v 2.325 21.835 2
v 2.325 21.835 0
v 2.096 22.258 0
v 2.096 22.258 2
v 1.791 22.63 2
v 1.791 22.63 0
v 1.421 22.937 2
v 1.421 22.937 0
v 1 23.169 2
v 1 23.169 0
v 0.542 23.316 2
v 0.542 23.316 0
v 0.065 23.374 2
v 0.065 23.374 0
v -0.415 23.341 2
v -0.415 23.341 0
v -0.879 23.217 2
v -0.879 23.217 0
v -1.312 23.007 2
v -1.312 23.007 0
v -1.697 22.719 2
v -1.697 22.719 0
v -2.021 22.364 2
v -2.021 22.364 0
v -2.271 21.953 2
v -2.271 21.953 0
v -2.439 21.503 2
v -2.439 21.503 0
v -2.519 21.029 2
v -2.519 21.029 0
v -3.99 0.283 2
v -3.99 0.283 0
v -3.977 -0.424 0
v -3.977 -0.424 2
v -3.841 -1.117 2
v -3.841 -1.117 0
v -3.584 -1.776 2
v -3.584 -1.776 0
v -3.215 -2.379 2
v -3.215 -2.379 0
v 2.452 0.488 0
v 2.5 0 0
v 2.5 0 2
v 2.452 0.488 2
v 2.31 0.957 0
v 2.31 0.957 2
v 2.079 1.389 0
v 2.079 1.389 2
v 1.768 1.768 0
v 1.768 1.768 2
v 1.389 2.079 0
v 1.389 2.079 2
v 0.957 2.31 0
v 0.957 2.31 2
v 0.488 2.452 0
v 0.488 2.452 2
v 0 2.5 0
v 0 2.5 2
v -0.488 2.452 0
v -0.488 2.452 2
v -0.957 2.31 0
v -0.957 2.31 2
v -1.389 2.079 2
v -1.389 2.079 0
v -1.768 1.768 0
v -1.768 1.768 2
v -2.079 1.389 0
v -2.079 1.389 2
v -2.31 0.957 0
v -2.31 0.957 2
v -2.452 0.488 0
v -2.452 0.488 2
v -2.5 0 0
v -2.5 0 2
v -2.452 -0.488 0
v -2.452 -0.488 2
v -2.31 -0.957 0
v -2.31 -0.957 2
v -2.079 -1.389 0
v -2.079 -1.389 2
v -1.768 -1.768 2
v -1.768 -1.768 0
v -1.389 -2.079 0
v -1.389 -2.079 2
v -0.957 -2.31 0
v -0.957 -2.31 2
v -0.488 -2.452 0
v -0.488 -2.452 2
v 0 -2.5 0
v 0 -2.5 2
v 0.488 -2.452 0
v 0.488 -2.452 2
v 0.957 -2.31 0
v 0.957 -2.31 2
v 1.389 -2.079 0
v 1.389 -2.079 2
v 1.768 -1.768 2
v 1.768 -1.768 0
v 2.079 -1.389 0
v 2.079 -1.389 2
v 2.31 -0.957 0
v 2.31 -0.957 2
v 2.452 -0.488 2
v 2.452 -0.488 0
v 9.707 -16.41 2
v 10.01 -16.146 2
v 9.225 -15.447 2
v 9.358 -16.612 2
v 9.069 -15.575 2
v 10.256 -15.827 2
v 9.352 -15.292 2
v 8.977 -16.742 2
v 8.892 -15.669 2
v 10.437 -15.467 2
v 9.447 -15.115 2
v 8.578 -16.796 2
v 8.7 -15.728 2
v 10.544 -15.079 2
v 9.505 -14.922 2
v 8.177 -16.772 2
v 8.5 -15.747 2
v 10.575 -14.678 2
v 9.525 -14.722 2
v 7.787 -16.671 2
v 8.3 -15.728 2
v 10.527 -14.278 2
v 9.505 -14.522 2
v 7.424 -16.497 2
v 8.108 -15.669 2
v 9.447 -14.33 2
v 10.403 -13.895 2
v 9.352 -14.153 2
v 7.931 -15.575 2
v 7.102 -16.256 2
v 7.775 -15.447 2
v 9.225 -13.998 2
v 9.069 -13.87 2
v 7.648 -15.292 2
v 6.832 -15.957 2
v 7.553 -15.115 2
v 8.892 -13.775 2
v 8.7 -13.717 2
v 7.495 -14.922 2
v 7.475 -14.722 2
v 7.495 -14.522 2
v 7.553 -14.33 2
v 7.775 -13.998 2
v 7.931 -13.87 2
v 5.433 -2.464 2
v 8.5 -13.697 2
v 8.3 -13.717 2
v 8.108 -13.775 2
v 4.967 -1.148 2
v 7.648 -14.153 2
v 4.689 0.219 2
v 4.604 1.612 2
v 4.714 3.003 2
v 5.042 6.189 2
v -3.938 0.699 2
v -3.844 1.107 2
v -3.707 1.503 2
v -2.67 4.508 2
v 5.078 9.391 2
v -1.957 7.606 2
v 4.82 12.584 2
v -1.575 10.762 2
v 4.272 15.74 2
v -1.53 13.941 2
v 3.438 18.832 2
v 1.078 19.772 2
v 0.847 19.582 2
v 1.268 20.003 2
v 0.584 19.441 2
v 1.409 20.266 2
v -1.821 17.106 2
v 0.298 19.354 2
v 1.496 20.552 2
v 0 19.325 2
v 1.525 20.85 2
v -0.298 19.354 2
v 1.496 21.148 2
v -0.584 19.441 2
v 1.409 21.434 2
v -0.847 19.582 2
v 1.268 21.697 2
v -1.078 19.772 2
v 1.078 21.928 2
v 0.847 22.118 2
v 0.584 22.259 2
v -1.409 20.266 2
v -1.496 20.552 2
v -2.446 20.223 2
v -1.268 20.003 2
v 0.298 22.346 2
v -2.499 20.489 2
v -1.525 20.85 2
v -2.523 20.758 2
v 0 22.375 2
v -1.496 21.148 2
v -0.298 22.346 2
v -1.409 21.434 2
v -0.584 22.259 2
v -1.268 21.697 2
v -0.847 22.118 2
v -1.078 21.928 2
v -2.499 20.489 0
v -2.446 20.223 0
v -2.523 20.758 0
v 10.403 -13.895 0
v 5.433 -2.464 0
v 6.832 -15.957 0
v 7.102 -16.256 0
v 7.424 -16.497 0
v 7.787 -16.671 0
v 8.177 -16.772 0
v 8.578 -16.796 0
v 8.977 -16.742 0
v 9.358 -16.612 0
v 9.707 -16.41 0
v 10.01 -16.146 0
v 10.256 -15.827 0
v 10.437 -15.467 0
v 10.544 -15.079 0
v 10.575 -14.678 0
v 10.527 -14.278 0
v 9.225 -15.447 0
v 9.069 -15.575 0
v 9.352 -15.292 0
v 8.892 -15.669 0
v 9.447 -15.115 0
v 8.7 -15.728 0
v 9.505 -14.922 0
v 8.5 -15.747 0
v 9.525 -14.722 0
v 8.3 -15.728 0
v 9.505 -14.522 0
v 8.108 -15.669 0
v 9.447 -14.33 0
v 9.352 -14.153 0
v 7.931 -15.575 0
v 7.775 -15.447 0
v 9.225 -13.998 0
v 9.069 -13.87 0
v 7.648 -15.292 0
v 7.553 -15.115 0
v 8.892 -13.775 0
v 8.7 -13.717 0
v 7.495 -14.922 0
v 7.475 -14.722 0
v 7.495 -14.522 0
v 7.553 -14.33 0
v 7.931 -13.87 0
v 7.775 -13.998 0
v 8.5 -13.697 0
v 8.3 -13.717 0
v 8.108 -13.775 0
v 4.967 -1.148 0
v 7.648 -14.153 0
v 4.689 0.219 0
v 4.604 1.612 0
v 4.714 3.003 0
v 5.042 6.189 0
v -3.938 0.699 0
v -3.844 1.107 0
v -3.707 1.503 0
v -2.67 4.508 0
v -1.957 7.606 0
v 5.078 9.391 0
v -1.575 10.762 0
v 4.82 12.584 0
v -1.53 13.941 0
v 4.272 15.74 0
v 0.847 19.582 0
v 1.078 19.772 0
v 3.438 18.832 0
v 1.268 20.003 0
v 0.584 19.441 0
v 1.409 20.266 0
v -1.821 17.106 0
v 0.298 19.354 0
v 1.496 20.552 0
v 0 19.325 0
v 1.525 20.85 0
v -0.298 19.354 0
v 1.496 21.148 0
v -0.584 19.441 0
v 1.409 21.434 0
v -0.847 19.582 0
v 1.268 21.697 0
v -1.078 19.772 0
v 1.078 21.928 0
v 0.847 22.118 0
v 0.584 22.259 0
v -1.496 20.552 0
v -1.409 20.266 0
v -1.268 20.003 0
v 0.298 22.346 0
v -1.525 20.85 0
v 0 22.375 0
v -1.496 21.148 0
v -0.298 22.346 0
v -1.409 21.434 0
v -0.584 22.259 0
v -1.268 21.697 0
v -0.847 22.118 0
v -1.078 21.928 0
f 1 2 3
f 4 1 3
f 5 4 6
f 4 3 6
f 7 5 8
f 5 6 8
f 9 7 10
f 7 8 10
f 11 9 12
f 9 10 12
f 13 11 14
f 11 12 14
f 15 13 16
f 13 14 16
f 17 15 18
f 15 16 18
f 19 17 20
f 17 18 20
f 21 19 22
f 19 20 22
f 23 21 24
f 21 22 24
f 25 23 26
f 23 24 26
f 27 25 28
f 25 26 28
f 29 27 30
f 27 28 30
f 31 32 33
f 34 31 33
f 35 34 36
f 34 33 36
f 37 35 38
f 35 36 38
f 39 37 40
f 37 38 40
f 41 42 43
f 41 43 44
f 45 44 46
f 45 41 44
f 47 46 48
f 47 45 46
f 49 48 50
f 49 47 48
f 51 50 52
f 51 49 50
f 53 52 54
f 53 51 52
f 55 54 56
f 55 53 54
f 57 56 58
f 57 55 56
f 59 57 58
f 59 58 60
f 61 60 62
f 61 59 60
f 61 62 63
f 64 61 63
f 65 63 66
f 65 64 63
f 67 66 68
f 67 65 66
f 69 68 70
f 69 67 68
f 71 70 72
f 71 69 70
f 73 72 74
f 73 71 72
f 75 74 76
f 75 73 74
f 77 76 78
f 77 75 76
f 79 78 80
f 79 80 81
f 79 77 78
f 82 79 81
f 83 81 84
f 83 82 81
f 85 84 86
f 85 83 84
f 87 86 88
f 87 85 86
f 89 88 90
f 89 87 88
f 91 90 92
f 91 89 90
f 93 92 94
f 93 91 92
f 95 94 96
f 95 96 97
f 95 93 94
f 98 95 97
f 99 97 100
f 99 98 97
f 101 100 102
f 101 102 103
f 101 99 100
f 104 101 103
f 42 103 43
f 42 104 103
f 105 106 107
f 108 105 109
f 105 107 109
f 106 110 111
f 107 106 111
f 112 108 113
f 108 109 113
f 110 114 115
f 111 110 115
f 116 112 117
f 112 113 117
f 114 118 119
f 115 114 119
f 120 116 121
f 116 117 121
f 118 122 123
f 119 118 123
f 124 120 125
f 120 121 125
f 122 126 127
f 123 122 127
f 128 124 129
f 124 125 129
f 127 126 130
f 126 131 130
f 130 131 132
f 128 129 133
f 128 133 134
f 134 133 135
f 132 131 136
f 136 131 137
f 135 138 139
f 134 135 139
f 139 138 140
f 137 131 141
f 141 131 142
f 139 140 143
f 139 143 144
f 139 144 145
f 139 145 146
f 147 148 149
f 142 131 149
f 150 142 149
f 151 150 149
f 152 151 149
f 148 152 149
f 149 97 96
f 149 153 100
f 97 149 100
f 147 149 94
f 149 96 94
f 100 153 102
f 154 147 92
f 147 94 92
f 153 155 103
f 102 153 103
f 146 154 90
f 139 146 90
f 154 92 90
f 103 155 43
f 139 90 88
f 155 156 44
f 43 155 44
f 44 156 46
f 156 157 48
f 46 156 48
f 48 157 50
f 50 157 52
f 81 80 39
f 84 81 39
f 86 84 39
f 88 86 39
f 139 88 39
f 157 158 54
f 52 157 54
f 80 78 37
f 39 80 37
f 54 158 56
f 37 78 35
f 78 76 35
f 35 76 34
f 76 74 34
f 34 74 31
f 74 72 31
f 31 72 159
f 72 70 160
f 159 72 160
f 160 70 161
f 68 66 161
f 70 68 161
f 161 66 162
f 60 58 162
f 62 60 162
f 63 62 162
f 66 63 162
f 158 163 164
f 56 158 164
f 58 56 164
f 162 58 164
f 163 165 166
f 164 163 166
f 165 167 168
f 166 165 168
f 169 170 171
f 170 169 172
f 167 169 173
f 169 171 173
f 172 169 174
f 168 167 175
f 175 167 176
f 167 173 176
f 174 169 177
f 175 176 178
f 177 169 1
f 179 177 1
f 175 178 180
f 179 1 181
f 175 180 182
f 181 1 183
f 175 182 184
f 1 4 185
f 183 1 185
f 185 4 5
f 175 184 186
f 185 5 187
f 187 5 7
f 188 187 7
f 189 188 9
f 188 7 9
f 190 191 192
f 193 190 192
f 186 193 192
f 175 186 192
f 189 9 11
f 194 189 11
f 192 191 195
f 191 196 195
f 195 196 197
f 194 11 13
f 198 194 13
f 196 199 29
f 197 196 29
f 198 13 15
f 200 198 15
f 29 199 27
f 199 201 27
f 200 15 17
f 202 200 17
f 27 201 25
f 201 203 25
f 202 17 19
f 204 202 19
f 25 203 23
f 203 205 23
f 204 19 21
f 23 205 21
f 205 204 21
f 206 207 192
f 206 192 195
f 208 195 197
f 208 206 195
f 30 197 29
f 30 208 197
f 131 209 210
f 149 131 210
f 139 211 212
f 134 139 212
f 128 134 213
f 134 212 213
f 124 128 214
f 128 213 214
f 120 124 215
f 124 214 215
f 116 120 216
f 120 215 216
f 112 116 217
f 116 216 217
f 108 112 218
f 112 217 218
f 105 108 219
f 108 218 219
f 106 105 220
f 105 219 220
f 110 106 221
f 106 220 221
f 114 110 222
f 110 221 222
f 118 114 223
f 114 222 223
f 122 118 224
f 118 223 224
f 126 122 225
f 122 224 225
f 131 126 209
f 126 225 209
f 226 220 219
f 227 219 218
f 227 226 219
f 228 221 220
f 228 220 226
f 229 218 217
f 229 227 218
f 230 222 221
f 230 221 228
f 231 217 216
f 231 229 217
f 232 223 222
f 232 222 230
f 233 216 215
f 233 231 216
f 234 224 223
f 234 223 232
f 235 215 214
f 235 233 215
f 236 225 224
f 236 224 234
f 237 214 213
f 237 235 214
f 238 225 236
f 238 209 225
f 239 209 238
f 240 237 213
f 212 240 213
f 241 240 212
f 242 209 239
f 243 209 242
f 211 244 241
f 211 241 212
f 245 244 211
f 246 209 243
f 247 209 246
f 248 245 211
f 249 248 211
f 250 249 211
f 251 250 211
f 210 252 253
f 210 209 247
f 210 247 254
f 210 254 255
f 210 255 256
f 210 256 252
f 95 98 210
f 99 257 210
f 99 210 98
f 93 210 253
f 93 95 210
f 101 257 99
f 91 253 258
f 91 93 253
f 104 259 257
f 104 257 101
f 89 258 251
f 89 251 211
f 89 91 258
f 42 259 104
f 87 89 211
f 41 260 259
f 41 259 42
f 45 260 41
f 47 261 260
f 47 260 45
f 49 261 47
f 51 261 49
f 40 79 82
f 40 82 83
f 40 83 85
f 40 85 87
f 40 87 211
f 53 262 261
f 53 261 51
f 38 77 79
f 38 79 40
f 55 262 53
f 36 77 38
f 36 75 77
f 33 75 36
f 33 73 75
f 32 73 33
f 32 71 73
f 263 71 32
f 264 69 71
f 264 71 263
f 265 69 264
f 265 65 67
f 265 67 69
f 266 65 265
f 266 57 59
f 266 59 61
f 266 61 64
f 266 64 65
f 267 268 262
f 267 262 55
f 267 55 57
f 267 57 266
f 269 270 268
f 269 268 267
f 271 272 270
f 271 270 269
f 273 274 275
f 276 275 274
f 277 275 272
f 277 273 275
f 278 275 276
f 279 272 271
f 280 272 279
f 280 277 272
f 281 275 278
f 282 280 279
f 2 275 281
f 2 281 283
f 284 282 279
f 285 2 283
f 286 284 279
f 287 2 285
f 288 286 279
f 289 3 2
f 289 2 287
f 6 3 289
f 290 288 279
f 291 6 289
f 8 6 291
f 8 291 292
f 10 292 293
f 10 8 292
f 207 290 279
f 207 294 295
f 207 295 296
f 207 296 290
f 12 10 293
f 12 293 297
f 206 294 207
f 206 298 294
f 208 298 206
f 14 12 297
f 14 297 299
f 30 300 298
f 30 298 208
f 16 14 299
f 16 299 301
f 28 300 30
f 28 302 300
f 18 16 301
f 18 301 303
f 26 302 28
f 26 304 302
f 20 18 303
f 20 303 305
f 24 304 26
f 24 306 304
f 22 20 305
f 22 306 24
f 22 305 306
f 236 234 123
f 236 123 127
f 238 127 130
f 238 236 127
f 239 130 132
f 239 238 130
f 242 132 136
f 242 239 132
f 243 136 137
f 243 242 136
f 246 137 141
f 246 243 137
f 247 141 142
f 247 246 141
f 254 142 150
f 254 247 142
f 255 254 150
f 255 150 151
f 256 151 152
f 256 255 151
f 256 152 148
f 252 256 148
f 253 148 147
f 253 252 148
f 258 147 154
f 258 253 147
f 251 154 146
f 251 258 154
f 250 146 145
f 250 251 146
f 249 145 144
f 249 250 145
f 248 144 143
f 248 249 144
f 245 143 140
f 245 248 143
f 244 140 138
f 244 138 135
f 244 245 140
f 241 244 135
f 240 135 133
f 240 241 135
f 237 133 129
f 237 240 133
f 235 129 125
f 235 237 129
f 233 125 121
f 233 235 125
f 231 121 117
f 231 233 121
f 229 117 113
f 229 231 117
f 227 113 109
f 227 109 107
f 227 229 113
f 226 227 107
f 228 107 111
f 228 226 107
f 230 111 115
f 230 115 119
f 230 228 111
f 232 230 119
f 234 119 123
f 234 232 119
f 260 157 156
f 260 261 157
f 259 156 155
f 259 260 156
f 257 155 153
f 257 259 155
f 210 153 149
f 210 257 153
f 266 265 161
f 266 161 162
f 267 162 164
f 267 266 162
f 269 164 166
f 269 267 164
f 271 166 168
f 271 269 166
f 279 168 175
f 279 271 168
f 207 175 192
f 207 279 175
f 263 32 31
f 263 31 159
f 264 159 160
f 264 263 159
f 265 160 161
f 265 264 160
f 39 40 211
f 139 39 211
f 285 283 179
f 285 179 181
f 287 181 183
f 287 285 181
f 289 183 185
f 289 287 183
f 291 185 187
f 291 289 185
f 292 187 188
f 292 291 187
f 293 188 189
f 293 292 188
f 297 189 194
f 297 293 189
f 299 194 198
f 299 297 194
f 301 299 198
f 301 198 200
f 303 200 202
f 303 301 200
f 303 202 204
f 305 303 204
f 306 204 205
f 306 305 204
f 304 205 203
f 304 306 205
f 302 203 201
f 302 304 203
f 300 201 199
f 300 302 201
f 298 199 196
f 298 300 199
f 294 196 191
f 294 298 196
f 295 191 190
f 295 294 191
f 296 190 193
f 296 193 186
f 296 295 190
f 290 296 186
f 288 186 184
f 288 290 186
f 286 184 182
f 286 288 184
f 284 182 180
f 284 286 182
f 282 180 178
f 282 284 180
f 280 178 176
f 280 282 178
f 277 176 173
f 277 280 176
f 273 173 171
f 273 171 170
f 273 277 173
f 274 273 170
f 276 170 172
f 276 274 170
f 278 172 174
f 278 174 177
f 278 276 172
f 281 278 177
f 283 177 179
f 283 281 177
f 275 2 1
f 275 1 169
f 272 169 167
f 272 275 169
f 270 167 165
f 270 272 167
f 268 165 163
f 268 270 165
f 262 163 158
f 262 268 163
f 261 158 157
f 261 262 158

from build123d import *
from build123d.topology import SkipClean

# Parameters (mm, degrees)
SKETCH_1_R          = 1.525
SKETCH_1_R_2        = 1.025
SKETCH_1_R_3        = 2.5
EXTRUDE_1_DEPTH     = 2
CUT_EXTRUDE_START   = -10
CUT_EXTRUDE_1_DEPTH = 10
EXTRUDE_START       = -2
EXTRUDE_2_DEPTH     = 2
FILLET_1_R          = 10


with BuildPart() as part:
    # 草图1 → 凸台-拉伸1 (new body)
    with BuildSketch(Plane.XY):
        with BuildLine():
            Line((-2.51867373, 21.028627098), (-3.989978187, 0.282973621))
            ThreePointArc((-3.989978187, 0.282973621), (-3.84073462, -1.117478224), (-3.215350618, -2.379394965))
            Line((-3.215350618, -2.379394965), (6.832036867, -15.956743003))
            ThreePointArc((6.832036867, -15.956743003), (9.5375, -16.519434577), (10.402926369, -13.895088987))
            Line((10.402926369, -13.895088987), (3.941503233, 0.966479061))
            Line((3.941503233, 0.966479061), (2.51867373, 21.028627098))
            ThreePointArc((2.51867373, 21.028627098), (0, 23.375), (-2.51867373, 21.028627098))
        make_face()
        with Locations((0, 20.85)):
            Circle(SKETCH_1_R, mode=Mode.SUBTRACT)
        with Locations((8.5, -14.722431864)):
            Circle(SKETCH_1_R_2, mode=Mode.SUBTRACT)
        Circle(SKETCH_1_R_3, mode=Mode.SUBTRACT)
    extrude(amount=EXTRUDE_1_DEPTH)

    # 草图2 → 切除-拉伸1 (cut)
    with SkipClean():  # the faces are left unmerged after this step: merging them gives an invalid solid
        with BuildSketch(Plane.XY.offset(2).offset(CUT_EXTRUDE_START)):
            with BuildLine():
                Line((-2.51867373, 21.028627098), (-3.989978187, 0.282973621))
                ThreePointArc((-3.989978187, 0.282973621), (-3.896440427, 0.904296412), (-3.706760113, 1.503306179))
                ThreePointArc((-3.706760113, 1.503306179), (-1.57526628, 10.762235027), (-2.446005808, 20.22335769))
                ThreePointArc((-2.446005808, 20.22335769), (-2.514781389, 20.623064846), (-2.51867373, 21.028627098))
            make_face()
        extrude(amount=CUT_EXTRUDE_1_DEPTH, mode=Mode.SUBTRACT)

    # 草图3 → 凸台-拉伸2 (add)
    with SkipClean():  # the faces are left unmerged after this step: merging them gives an invalid solid
        with BuildSketch(Plane.XY.offset(2).offset(EXTRUDE_START)):
            with BuildLine():
                Line((0, 4), (0, 18.325))
                ThreePointArc((0, 18.325), (2.105124017, 19.455698069), (2.324893847, 21.835136337))
                ThreePointArc((2.324893847, 21.835136337), (5.020381454, 10.519043648), (3.858239677, -1.055455635))
                ThreePointArc((3.858239677, -1.055455635), (3.179765914, 2.426744471), (0, 4))
            make_face()
        extrude(amount=EXTRUDE_2_DEPTH)

    # 圆角1
    fillet_1_edges = [part.edges().sort_by_distance(p)[0] for p in [
        (4.210891787, 0.346873093, 1),
    ]]
    fillet(fillet_1_edges, radius=FILLET_1_R)


solid = part.part
